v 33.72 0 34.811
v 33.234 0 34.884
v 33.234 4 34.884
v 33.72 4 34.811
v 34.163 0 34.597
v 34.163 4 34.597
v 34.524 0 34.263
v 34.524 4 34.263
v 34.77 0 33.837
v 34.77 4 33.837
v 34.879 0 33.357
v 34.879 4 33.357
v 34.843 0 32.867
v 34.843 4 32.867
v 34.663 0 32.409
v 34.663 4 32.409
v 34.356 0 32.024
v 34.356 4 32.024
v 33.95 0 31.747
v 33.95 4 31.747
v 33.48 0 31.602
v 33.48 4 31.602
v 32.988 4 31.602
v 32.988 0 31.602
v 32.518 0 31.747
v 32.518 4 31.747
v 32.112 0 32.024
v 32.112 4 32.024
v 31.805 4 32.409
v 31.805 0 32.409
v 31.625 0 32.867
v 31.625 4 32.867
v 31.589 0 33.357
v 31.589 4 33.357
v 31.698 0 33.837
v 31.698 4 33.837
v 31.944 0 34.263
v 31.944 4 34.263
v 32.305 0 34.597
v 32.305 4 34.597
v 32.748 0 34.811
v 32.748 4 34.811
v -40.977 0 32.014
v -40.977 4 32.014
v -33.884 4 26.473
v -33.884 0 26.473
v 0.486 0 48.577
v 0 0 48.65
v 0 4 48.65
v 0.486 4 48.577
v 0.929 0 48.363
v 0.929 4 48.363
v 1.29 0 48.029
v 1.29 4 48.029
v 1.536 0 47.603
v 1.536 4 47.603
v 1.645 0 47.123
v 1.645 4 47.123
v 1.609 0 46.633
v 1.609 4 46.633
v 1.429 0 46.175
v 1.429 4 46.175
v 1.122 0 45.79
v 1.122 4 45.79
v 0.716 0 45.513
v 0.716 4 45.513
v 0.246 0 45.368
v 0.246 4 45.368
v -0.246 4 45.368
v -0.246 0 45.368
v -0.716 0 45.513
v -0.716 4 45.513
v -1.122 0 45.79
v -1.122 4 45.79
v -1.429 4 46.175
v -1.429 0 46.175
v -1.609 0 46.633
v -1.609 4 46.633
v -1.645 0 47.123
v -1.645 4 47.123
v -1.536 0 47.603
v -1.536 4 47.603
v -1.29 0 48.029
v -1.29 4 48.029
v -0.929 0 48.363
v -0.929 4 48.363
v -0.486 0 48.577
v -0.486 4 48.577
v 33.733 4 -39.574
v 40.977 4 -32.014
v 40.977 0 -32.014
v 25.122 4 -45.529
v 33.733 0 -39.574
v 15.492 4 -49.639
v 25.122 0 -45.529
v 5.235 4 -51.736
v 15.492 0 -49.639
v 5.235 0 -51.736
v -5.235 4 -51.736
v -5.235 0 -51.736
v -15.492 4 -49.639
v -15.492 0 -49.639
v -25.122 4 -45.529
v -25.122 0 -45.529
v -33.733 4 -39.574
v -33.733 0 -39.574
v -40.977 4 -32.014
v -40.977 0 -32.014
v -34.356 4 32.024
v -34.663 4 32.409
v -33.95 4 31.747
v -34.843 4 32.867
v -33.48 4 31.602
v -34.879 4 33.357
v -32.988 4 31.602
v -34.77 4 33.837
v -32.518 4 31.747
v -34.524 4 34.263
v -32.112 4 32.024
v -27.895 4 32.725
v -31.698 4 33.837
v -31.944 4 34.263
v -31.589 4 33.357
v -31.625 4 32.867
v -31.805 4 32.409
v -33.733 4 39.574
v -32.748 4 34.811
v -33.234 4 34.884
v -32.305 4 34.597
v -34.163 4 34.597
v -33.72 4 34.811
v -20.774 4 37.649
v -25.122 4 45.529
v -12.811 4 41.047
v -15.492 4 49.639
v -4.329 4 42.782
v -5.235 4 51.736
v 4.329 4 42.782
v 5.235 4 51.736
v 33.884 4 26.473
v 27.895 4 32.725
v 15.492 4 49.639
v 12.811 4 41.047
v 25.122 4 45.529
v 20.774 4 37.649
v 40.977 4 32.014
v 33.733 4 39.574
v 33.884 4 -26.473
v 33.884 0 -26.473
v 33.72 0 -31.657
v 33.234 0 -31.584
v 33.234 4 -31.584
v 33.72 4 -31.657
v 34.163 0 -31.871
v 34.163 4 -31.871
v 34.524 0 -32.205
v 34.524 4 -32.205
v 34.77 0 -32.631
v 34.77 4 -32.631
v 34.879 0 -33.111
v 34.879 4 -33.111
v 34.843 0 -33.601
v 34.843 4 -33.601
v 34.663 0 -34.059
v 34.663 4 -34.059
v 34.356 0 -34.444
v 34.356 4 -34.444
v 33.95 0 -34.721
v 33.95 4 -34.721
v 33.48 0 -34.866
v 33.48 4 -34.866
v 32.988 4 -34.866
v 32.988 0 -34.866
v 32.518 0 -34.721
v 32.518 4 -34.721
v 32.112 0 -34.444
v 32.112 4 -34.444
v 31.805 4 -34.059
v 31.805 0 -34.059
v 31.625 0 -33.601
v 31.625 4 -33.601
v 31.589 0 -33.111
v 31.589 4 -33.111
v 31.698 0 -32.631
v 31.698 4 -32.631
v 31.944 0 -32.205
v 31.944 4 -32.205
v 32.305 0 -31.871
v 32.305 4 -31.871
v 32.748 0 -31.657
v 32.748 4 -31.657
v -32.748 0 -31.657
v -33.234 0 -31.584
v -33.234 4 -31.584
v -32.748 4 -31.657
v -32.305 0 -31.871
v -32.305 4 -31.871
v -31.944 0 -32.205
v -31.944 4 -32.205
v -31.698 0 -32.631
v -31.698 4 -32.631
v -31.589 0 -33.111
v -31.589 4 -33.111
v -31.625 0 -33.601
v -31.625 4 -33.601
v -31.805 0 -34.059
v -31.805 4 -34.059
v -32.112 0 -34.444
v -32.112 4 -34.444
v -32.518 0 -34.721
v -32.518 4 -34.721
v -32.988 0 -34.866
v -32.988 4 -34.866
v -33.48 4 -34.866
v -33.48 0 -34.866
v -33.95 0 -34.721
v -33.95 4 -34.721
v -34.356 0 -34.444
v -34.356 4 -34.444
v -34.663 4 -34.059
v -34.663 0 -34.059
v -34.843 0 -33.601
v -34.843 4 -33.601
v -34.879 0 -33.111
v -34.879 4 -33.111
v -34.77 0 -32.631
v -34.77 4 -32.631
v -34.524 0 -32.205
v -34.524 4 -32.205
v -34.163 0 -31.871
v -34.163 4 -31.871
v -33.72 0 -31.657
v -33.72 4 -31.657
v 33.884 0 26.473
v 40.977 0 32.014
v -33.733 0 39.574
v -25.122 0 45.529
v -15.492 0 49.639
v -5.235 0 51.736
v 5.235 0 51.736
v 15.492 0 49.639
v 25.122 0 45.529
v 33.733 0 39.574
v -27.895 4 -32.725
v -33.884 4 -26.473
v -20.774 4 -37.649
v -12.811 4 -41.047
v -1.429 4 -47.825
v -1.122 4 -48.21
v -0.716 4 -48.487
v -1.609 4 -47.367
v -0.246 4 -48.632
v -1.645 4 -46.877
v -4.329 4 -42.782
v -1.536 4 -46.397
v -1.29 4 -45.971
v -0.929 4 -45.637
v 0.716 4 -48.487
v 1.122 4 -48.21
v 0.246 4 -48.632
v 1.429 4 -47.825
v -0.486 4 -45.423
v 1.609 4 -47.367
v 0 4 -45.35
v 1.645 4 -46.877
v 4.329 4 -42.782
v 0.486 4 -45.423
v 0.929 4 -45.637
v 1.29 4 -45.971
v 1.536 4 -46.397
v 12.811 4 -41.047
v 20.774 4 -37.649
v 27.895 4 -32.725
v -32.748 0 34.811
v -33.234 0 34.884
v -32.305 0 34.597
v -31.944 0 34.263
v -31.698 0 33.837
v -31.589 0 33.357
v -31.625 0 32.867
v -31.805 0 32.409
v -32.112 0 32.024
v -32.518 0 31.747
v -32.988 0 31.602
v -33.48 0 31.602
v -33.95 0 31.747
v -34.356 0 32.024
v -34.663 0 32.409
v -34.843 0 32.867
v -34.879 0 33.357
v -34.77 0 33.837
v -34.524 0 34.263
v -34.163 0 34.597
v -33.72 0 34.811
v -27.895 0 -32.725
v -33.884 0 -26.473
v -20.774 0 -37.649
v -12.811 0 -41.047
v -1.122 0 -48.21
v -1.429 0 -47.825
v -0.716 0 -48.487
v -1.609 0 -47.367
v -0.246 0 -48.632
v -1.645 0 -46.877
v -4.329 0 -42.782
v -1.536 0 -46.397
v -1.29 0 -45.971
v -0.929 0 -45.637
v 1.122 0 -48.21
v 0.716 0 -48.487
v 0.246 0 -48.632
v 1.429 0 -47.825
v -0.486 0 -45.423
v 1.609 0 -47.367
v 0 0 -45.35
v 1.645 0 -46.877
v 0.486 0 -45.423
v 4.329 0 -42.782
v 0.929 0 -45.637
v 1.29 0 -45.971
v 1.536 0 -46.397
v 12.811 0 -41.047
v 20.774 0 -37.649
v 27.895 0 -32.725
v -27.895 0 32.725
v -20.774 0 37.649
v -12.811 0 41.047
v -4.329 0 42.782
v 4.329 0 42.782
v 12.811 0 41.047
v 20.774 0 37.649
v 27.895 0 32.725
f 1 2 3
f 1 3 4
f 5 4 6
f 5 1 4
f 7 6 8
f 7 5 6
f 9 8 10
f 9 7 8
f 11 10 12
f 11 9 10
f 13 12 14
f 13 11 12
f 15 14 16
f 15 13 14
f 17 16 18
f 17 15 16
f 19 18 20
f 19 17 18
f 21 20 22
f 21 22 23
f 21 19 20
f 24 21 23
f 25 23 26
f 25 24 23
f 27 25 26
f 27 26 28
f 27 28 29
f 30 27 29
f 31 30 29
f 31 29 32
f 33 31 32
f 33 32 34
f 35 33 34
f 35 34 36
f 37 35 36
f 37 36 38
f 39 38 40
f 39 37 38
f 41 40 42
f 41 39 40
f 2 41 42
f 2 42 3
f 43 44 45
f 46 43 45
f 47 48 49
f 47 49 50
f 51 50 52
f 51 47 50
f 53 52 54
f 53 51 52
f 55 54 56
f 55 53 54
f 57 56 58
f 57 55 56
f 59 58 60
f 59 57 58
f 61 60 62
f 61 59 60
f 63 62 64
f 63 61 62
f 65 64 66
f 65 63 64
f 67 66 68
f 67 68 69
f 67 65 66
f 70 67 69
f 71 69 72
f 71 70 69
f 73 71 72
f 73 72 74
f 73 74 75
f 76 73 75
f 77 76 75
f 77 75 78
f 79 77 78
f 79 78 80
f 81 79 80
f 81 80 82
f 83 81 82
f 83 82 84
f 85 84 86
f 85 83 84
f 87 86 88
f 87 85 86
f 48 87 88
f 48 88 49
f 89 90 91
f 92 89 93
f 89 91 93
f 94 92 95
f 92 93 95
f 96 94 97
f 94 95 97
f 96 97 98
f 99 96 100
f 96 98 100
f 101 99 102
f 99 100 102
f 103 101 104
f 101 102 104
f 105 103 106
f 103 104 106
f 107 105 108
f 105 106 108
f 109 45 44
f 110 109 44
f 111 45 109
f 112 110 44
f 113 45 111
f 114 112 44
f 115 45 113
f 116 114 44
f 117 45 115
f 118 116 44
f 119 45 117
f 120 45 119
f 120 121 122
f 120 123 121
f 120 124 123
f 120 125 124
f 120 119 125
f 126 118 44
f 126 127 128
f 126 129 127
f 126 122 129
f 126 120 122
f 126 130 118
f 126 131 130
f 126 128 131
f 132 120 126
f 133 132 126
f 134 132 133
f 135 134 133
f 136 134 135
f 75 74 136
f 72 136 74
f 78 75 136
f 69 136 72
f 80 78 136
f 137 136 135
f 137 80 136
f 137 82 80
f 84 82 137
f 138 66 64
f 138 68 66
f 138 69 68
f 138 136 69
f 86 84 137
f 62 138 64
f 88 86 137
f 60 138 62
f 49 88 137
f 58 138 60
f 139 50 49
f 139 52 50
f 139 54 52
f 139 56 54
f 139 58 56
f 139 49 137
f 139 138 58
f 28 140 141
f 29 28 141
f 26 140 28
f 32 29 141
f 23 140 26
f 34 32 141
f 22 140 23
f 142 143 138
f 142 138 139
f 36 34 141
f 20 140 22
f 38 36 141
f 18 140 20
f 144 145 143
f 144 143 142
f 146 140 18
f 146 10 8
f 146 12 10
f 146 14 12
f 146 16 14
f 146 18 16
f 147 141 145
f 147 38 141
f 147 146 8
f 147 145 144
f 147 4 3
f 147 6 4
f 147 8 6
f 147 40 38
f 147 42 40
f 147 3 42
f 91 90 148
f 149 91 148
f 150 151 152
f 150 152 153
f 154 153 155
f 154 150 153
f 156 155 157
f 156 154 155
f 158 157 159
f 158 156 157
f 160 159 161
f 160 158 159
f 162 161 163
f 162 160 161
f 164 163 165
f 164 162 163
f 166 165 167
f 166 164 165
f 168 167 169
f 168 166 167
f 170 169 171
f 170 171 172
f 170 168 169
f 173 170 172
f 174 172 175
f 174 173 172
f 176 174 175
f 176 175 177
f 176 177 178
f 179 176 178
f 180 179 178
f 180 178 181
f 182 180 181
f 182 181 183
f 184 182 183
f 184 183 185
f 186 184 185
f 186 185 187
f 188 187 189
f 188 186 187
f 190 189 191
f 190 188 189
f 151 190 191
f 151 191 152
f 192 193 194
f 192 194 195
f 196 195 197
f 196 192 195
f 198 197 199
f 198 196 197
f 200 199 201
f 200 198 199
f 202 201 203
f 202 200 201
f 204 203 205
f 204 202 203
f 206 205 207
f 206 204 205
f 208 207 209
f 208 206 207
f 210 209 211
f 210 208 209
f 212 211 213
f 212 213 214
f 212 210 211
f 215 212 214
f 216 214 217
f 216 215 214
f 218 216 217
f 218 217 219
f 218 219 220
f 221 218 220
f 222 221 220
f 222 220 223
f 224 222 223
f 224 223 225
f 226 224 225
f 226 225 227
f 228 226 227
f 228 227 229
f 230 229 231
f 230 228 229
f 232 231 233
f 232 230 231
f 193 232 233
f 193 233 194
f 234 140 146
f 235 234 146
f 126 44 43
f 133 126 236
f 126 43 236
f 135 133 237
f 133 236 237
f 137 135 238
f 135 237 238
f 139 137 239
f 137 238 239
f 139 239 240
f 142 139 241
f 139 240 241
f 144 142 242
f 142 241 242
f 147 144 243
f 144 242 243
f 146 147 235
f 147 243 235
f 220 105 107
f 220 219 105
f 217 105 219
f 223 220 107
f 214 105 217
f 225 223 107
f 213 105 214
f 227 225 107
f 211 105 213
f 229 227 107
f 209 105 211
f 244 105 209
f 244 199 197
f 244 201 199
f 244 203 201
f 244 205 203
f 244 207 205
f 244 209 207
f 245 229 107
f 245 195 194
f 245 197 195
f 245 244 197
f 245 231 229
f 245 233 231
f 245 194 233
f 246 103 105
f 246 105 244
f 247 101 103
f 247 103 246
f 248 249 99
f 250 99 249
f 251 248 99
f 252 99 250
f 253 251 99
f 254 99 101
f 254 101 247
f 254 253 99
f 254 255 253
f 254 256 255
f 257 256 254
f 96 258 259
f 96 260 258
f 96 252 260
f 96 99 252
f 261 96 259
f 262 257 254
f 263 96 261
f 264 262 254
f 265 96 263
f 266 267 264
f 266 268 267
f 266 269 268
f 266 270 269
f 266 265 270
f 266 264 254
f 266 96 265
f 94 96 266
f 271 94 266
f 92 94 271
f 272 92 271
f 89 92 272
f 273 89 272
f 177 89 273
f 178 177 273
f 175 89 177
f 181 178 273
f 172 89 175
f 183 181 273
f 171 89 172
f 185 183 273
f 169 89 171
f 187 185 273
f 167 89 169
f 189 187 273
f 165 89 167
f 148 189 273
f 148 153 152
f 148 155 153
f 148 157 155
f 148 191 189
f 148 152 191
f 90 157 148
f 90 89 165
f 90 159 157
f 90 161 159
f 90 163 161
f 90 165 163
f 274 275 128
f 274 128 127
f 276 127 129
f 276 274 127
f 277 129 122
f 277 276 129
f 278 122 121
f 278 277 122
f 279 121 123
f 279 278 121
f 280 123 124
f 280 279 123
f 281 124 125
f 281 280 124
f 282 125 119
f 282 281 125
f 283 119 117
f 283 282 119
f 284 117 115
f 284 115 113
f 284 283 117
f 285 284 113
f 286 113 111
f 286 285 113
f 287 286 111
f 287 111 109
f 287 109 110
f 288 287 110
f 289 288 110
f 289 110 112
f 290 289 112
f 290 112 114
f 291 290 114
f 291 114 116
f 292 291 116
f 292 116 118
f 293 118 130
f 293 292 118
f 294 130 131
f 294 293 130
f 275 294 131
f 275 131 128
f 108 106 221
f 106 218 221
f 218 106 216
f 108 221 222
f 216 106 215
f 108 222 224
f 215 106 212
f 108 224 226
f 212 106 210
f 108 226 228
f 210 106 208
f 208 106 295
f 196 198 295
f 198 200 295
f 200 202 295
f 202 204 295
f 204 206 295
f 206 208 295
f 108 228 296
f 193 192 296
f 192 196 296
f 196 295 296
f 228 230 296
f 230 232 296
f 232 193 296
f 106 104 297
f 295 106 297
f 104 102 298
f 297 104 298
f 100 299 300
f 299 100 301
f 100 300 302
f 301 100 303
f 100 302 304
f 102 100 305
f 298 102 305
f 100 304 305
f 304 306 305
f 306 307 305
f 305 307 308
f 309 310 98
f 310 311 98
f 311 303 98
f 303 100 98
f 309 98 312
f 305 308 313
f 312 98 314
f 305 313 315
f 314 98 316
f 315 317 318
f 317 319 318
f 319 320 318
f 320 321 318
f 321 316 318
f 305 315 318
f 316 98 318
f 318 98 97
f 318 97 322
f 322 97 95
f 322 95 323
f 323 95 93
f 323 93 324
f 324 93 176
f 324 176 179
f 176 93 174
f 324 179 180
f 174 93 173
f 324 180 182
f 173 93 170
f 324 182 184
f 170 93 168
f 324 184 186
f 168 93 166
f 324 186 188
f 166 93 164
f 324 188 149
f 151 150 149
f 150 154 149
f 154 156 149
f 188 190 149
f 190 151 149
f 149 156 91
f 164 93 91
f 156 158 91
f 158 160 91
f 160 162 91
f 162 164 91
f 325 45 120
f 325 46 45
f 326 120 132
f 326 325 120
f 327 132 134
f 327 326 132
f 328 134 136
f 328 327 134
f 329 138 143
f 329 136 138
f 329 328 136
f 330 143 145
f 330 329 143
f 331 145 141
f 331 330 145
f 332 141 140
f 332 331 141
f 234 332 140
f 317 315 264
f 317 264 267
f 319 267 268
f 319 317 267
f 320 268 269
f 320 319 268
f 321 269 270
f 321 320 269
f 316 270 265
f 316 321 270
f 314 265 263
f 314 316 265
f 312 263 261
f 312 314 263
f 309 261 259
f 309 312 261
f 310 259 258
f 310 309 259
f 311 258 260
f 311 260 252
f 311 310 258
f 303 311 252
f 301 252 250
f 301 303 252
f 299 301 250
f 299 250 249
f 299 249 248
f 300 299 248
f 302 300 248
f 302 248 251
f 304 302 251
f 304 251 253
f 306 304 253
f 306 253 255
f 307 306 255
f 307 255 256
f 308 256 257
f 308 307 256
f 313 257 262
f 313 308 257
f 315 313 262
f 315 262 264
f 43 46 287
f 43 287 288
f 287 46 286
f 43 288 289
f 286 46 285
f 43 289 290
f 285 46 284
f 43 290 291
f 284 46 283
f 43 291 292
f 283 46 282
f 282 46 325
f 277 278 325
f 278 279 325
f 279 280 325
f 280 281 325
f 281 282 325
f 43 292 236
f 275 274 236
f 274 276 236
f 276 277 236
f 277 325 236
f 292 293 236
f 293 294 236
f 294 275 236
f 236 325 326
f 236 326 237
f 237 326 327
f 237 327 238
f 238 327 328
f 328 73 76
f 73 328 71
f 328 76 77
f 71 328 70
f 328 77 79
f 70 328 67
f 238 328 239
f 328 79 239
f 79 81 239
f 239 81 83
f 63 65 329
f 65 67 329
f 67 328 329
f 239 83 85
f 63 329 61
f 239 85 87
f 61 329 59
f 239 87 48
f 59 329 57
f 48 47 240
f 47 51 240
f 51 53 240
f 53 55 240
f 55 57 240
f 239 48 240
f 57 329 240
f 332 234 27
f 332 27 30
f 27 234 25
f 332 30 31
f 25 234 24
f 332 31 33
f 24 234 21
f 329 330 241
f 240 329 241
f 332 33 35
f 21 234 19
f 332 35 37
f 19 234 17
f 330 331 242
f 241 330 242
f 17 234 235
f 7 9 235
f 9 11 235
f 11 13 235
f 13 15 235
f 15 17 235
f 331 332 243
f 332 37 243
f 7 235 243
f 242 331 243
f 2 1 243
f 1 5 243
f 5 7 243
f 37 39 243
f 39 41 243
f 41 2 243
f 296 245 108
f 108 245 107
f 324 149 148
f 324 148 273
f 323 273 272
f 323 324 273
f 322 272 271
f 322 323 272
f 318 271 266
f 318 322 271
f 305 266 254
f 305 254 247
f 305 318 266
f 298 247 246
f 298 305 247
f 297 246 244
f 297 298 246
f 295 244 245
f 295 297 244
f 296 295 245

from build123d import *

# Parameters (mm, degrees)
SKETCH_1_R          = 52
SKETCH_1_R_2        = 43
SKETCH_1_R_3        = 1.65
EXTRUDE_1_DEPTH     = 4
CUT_EXTRUDE_2_DEPTH = 10


with BuildPart() as part:
    # 草图1 → 凸台-拉伸1 (new body)
    with BuildSketch(Plane(origin=(0, 0, 0), x_dir=(1, 0, 0), z_dir=(0, 1, 0))):
        with Locations(Location((0, 0, 0), (0, 0, 270))):
            Circle(SKETCH_1_R)
        with Locations(Location((0, 0, 0), (0, 0, 270))):
            Circle(SKETCH_1_R_2, mode=Mode.SUBTRACT)
        with Locations(Location((47, 0, 0), (0, 0, 270))):
            Circle(SKETCH_1_R_3, mode=Mode.SUBTRACT)
        with Locations(Location((33.234018716, -33.234018716, 0), (0, 0, 270))):
            Circle(SKETCH_1_R_3, mode=Mode.SUBTRACT)
        with Locations(Location((0, -47, 0), (0, 0, 270))):
            Circle(SKETCH_1_R_3, mode=Mode.SUBTRACT)
        with Locations(Location((-33.234018716, -33.234018716, 0), (0, 0, 270))):
            Circle(SKETCH_1_R_3, mode=Mode.SUBTRACT)
        with Locations(Location((-47, 0, 0), (0, 0, 270))):
            Circle(SKETCH_1_R_3, mode=Mode.SUBTRACT)
        with Locations(Location((-33.234018716, 33.234018716, 0), (0, 0, 270))):
            Circle(SKETCH_1_R_3, mode=Mode.SUBTRACT)
        with Locations(Location((0, 47, 0), (0, 0, 270))):
            Circle(SKETCH_1_R_3, mode=Mode.SUBTRACT)
        with Locations(Location((33.234018716, 33.234018716, 0), (0, 0, 270))):
            Circle(SKETCH_1_R_3, mode=Mode.SUBTRACT)
    extrude(amount=EXTRUDE_1_DEPTH)

    # 草图2 → 切除-拉伸2 (cut)
    with BuildSketch(Plane(origin=(0, 4, 0), x_dir=(1, 0, 0), z_dir=(0, 1, 0))):
        Polygon((32.7612153, 25.59586662), (0, 0), (32.7612153, -25.59586662), (53.158039477, -41.531612177), (53.158039477, 41.531612177), align=None)
        Polygon((-32.7612153, -25.59586662), (0, 0), (-32.7612153, 25.59586662), (-53.158039477, 41.531612177), (-53.158039477, -41.531612177), align=None)
    extrude(amount=-CUT_EXTRUDE_2_DEPTH, mode=Mode.SUBTRACT)


with BuildPart() as cut_extrude_2_piece_1:
    # of the separate pieces the step leaves, piece 1, a body of its own (cut_extrude_2_pieces)
    add(part.part.solids().sort_by_distance((-40.976559188, 0, 32.014396717))[0])


with BuildPart() as cut_extrude_2_piece_2:
    # of the separate pieces the step leaves, piece 2, a body of its own (cut_extrude_2_pieces)
    add(part.part.solids().sort_by_distance((40.976559188, 0, -32.014396717))[0])


solid = Compound([cut_extrude_2_piece_1.part, cut_extrude_2_piece_2.part])
